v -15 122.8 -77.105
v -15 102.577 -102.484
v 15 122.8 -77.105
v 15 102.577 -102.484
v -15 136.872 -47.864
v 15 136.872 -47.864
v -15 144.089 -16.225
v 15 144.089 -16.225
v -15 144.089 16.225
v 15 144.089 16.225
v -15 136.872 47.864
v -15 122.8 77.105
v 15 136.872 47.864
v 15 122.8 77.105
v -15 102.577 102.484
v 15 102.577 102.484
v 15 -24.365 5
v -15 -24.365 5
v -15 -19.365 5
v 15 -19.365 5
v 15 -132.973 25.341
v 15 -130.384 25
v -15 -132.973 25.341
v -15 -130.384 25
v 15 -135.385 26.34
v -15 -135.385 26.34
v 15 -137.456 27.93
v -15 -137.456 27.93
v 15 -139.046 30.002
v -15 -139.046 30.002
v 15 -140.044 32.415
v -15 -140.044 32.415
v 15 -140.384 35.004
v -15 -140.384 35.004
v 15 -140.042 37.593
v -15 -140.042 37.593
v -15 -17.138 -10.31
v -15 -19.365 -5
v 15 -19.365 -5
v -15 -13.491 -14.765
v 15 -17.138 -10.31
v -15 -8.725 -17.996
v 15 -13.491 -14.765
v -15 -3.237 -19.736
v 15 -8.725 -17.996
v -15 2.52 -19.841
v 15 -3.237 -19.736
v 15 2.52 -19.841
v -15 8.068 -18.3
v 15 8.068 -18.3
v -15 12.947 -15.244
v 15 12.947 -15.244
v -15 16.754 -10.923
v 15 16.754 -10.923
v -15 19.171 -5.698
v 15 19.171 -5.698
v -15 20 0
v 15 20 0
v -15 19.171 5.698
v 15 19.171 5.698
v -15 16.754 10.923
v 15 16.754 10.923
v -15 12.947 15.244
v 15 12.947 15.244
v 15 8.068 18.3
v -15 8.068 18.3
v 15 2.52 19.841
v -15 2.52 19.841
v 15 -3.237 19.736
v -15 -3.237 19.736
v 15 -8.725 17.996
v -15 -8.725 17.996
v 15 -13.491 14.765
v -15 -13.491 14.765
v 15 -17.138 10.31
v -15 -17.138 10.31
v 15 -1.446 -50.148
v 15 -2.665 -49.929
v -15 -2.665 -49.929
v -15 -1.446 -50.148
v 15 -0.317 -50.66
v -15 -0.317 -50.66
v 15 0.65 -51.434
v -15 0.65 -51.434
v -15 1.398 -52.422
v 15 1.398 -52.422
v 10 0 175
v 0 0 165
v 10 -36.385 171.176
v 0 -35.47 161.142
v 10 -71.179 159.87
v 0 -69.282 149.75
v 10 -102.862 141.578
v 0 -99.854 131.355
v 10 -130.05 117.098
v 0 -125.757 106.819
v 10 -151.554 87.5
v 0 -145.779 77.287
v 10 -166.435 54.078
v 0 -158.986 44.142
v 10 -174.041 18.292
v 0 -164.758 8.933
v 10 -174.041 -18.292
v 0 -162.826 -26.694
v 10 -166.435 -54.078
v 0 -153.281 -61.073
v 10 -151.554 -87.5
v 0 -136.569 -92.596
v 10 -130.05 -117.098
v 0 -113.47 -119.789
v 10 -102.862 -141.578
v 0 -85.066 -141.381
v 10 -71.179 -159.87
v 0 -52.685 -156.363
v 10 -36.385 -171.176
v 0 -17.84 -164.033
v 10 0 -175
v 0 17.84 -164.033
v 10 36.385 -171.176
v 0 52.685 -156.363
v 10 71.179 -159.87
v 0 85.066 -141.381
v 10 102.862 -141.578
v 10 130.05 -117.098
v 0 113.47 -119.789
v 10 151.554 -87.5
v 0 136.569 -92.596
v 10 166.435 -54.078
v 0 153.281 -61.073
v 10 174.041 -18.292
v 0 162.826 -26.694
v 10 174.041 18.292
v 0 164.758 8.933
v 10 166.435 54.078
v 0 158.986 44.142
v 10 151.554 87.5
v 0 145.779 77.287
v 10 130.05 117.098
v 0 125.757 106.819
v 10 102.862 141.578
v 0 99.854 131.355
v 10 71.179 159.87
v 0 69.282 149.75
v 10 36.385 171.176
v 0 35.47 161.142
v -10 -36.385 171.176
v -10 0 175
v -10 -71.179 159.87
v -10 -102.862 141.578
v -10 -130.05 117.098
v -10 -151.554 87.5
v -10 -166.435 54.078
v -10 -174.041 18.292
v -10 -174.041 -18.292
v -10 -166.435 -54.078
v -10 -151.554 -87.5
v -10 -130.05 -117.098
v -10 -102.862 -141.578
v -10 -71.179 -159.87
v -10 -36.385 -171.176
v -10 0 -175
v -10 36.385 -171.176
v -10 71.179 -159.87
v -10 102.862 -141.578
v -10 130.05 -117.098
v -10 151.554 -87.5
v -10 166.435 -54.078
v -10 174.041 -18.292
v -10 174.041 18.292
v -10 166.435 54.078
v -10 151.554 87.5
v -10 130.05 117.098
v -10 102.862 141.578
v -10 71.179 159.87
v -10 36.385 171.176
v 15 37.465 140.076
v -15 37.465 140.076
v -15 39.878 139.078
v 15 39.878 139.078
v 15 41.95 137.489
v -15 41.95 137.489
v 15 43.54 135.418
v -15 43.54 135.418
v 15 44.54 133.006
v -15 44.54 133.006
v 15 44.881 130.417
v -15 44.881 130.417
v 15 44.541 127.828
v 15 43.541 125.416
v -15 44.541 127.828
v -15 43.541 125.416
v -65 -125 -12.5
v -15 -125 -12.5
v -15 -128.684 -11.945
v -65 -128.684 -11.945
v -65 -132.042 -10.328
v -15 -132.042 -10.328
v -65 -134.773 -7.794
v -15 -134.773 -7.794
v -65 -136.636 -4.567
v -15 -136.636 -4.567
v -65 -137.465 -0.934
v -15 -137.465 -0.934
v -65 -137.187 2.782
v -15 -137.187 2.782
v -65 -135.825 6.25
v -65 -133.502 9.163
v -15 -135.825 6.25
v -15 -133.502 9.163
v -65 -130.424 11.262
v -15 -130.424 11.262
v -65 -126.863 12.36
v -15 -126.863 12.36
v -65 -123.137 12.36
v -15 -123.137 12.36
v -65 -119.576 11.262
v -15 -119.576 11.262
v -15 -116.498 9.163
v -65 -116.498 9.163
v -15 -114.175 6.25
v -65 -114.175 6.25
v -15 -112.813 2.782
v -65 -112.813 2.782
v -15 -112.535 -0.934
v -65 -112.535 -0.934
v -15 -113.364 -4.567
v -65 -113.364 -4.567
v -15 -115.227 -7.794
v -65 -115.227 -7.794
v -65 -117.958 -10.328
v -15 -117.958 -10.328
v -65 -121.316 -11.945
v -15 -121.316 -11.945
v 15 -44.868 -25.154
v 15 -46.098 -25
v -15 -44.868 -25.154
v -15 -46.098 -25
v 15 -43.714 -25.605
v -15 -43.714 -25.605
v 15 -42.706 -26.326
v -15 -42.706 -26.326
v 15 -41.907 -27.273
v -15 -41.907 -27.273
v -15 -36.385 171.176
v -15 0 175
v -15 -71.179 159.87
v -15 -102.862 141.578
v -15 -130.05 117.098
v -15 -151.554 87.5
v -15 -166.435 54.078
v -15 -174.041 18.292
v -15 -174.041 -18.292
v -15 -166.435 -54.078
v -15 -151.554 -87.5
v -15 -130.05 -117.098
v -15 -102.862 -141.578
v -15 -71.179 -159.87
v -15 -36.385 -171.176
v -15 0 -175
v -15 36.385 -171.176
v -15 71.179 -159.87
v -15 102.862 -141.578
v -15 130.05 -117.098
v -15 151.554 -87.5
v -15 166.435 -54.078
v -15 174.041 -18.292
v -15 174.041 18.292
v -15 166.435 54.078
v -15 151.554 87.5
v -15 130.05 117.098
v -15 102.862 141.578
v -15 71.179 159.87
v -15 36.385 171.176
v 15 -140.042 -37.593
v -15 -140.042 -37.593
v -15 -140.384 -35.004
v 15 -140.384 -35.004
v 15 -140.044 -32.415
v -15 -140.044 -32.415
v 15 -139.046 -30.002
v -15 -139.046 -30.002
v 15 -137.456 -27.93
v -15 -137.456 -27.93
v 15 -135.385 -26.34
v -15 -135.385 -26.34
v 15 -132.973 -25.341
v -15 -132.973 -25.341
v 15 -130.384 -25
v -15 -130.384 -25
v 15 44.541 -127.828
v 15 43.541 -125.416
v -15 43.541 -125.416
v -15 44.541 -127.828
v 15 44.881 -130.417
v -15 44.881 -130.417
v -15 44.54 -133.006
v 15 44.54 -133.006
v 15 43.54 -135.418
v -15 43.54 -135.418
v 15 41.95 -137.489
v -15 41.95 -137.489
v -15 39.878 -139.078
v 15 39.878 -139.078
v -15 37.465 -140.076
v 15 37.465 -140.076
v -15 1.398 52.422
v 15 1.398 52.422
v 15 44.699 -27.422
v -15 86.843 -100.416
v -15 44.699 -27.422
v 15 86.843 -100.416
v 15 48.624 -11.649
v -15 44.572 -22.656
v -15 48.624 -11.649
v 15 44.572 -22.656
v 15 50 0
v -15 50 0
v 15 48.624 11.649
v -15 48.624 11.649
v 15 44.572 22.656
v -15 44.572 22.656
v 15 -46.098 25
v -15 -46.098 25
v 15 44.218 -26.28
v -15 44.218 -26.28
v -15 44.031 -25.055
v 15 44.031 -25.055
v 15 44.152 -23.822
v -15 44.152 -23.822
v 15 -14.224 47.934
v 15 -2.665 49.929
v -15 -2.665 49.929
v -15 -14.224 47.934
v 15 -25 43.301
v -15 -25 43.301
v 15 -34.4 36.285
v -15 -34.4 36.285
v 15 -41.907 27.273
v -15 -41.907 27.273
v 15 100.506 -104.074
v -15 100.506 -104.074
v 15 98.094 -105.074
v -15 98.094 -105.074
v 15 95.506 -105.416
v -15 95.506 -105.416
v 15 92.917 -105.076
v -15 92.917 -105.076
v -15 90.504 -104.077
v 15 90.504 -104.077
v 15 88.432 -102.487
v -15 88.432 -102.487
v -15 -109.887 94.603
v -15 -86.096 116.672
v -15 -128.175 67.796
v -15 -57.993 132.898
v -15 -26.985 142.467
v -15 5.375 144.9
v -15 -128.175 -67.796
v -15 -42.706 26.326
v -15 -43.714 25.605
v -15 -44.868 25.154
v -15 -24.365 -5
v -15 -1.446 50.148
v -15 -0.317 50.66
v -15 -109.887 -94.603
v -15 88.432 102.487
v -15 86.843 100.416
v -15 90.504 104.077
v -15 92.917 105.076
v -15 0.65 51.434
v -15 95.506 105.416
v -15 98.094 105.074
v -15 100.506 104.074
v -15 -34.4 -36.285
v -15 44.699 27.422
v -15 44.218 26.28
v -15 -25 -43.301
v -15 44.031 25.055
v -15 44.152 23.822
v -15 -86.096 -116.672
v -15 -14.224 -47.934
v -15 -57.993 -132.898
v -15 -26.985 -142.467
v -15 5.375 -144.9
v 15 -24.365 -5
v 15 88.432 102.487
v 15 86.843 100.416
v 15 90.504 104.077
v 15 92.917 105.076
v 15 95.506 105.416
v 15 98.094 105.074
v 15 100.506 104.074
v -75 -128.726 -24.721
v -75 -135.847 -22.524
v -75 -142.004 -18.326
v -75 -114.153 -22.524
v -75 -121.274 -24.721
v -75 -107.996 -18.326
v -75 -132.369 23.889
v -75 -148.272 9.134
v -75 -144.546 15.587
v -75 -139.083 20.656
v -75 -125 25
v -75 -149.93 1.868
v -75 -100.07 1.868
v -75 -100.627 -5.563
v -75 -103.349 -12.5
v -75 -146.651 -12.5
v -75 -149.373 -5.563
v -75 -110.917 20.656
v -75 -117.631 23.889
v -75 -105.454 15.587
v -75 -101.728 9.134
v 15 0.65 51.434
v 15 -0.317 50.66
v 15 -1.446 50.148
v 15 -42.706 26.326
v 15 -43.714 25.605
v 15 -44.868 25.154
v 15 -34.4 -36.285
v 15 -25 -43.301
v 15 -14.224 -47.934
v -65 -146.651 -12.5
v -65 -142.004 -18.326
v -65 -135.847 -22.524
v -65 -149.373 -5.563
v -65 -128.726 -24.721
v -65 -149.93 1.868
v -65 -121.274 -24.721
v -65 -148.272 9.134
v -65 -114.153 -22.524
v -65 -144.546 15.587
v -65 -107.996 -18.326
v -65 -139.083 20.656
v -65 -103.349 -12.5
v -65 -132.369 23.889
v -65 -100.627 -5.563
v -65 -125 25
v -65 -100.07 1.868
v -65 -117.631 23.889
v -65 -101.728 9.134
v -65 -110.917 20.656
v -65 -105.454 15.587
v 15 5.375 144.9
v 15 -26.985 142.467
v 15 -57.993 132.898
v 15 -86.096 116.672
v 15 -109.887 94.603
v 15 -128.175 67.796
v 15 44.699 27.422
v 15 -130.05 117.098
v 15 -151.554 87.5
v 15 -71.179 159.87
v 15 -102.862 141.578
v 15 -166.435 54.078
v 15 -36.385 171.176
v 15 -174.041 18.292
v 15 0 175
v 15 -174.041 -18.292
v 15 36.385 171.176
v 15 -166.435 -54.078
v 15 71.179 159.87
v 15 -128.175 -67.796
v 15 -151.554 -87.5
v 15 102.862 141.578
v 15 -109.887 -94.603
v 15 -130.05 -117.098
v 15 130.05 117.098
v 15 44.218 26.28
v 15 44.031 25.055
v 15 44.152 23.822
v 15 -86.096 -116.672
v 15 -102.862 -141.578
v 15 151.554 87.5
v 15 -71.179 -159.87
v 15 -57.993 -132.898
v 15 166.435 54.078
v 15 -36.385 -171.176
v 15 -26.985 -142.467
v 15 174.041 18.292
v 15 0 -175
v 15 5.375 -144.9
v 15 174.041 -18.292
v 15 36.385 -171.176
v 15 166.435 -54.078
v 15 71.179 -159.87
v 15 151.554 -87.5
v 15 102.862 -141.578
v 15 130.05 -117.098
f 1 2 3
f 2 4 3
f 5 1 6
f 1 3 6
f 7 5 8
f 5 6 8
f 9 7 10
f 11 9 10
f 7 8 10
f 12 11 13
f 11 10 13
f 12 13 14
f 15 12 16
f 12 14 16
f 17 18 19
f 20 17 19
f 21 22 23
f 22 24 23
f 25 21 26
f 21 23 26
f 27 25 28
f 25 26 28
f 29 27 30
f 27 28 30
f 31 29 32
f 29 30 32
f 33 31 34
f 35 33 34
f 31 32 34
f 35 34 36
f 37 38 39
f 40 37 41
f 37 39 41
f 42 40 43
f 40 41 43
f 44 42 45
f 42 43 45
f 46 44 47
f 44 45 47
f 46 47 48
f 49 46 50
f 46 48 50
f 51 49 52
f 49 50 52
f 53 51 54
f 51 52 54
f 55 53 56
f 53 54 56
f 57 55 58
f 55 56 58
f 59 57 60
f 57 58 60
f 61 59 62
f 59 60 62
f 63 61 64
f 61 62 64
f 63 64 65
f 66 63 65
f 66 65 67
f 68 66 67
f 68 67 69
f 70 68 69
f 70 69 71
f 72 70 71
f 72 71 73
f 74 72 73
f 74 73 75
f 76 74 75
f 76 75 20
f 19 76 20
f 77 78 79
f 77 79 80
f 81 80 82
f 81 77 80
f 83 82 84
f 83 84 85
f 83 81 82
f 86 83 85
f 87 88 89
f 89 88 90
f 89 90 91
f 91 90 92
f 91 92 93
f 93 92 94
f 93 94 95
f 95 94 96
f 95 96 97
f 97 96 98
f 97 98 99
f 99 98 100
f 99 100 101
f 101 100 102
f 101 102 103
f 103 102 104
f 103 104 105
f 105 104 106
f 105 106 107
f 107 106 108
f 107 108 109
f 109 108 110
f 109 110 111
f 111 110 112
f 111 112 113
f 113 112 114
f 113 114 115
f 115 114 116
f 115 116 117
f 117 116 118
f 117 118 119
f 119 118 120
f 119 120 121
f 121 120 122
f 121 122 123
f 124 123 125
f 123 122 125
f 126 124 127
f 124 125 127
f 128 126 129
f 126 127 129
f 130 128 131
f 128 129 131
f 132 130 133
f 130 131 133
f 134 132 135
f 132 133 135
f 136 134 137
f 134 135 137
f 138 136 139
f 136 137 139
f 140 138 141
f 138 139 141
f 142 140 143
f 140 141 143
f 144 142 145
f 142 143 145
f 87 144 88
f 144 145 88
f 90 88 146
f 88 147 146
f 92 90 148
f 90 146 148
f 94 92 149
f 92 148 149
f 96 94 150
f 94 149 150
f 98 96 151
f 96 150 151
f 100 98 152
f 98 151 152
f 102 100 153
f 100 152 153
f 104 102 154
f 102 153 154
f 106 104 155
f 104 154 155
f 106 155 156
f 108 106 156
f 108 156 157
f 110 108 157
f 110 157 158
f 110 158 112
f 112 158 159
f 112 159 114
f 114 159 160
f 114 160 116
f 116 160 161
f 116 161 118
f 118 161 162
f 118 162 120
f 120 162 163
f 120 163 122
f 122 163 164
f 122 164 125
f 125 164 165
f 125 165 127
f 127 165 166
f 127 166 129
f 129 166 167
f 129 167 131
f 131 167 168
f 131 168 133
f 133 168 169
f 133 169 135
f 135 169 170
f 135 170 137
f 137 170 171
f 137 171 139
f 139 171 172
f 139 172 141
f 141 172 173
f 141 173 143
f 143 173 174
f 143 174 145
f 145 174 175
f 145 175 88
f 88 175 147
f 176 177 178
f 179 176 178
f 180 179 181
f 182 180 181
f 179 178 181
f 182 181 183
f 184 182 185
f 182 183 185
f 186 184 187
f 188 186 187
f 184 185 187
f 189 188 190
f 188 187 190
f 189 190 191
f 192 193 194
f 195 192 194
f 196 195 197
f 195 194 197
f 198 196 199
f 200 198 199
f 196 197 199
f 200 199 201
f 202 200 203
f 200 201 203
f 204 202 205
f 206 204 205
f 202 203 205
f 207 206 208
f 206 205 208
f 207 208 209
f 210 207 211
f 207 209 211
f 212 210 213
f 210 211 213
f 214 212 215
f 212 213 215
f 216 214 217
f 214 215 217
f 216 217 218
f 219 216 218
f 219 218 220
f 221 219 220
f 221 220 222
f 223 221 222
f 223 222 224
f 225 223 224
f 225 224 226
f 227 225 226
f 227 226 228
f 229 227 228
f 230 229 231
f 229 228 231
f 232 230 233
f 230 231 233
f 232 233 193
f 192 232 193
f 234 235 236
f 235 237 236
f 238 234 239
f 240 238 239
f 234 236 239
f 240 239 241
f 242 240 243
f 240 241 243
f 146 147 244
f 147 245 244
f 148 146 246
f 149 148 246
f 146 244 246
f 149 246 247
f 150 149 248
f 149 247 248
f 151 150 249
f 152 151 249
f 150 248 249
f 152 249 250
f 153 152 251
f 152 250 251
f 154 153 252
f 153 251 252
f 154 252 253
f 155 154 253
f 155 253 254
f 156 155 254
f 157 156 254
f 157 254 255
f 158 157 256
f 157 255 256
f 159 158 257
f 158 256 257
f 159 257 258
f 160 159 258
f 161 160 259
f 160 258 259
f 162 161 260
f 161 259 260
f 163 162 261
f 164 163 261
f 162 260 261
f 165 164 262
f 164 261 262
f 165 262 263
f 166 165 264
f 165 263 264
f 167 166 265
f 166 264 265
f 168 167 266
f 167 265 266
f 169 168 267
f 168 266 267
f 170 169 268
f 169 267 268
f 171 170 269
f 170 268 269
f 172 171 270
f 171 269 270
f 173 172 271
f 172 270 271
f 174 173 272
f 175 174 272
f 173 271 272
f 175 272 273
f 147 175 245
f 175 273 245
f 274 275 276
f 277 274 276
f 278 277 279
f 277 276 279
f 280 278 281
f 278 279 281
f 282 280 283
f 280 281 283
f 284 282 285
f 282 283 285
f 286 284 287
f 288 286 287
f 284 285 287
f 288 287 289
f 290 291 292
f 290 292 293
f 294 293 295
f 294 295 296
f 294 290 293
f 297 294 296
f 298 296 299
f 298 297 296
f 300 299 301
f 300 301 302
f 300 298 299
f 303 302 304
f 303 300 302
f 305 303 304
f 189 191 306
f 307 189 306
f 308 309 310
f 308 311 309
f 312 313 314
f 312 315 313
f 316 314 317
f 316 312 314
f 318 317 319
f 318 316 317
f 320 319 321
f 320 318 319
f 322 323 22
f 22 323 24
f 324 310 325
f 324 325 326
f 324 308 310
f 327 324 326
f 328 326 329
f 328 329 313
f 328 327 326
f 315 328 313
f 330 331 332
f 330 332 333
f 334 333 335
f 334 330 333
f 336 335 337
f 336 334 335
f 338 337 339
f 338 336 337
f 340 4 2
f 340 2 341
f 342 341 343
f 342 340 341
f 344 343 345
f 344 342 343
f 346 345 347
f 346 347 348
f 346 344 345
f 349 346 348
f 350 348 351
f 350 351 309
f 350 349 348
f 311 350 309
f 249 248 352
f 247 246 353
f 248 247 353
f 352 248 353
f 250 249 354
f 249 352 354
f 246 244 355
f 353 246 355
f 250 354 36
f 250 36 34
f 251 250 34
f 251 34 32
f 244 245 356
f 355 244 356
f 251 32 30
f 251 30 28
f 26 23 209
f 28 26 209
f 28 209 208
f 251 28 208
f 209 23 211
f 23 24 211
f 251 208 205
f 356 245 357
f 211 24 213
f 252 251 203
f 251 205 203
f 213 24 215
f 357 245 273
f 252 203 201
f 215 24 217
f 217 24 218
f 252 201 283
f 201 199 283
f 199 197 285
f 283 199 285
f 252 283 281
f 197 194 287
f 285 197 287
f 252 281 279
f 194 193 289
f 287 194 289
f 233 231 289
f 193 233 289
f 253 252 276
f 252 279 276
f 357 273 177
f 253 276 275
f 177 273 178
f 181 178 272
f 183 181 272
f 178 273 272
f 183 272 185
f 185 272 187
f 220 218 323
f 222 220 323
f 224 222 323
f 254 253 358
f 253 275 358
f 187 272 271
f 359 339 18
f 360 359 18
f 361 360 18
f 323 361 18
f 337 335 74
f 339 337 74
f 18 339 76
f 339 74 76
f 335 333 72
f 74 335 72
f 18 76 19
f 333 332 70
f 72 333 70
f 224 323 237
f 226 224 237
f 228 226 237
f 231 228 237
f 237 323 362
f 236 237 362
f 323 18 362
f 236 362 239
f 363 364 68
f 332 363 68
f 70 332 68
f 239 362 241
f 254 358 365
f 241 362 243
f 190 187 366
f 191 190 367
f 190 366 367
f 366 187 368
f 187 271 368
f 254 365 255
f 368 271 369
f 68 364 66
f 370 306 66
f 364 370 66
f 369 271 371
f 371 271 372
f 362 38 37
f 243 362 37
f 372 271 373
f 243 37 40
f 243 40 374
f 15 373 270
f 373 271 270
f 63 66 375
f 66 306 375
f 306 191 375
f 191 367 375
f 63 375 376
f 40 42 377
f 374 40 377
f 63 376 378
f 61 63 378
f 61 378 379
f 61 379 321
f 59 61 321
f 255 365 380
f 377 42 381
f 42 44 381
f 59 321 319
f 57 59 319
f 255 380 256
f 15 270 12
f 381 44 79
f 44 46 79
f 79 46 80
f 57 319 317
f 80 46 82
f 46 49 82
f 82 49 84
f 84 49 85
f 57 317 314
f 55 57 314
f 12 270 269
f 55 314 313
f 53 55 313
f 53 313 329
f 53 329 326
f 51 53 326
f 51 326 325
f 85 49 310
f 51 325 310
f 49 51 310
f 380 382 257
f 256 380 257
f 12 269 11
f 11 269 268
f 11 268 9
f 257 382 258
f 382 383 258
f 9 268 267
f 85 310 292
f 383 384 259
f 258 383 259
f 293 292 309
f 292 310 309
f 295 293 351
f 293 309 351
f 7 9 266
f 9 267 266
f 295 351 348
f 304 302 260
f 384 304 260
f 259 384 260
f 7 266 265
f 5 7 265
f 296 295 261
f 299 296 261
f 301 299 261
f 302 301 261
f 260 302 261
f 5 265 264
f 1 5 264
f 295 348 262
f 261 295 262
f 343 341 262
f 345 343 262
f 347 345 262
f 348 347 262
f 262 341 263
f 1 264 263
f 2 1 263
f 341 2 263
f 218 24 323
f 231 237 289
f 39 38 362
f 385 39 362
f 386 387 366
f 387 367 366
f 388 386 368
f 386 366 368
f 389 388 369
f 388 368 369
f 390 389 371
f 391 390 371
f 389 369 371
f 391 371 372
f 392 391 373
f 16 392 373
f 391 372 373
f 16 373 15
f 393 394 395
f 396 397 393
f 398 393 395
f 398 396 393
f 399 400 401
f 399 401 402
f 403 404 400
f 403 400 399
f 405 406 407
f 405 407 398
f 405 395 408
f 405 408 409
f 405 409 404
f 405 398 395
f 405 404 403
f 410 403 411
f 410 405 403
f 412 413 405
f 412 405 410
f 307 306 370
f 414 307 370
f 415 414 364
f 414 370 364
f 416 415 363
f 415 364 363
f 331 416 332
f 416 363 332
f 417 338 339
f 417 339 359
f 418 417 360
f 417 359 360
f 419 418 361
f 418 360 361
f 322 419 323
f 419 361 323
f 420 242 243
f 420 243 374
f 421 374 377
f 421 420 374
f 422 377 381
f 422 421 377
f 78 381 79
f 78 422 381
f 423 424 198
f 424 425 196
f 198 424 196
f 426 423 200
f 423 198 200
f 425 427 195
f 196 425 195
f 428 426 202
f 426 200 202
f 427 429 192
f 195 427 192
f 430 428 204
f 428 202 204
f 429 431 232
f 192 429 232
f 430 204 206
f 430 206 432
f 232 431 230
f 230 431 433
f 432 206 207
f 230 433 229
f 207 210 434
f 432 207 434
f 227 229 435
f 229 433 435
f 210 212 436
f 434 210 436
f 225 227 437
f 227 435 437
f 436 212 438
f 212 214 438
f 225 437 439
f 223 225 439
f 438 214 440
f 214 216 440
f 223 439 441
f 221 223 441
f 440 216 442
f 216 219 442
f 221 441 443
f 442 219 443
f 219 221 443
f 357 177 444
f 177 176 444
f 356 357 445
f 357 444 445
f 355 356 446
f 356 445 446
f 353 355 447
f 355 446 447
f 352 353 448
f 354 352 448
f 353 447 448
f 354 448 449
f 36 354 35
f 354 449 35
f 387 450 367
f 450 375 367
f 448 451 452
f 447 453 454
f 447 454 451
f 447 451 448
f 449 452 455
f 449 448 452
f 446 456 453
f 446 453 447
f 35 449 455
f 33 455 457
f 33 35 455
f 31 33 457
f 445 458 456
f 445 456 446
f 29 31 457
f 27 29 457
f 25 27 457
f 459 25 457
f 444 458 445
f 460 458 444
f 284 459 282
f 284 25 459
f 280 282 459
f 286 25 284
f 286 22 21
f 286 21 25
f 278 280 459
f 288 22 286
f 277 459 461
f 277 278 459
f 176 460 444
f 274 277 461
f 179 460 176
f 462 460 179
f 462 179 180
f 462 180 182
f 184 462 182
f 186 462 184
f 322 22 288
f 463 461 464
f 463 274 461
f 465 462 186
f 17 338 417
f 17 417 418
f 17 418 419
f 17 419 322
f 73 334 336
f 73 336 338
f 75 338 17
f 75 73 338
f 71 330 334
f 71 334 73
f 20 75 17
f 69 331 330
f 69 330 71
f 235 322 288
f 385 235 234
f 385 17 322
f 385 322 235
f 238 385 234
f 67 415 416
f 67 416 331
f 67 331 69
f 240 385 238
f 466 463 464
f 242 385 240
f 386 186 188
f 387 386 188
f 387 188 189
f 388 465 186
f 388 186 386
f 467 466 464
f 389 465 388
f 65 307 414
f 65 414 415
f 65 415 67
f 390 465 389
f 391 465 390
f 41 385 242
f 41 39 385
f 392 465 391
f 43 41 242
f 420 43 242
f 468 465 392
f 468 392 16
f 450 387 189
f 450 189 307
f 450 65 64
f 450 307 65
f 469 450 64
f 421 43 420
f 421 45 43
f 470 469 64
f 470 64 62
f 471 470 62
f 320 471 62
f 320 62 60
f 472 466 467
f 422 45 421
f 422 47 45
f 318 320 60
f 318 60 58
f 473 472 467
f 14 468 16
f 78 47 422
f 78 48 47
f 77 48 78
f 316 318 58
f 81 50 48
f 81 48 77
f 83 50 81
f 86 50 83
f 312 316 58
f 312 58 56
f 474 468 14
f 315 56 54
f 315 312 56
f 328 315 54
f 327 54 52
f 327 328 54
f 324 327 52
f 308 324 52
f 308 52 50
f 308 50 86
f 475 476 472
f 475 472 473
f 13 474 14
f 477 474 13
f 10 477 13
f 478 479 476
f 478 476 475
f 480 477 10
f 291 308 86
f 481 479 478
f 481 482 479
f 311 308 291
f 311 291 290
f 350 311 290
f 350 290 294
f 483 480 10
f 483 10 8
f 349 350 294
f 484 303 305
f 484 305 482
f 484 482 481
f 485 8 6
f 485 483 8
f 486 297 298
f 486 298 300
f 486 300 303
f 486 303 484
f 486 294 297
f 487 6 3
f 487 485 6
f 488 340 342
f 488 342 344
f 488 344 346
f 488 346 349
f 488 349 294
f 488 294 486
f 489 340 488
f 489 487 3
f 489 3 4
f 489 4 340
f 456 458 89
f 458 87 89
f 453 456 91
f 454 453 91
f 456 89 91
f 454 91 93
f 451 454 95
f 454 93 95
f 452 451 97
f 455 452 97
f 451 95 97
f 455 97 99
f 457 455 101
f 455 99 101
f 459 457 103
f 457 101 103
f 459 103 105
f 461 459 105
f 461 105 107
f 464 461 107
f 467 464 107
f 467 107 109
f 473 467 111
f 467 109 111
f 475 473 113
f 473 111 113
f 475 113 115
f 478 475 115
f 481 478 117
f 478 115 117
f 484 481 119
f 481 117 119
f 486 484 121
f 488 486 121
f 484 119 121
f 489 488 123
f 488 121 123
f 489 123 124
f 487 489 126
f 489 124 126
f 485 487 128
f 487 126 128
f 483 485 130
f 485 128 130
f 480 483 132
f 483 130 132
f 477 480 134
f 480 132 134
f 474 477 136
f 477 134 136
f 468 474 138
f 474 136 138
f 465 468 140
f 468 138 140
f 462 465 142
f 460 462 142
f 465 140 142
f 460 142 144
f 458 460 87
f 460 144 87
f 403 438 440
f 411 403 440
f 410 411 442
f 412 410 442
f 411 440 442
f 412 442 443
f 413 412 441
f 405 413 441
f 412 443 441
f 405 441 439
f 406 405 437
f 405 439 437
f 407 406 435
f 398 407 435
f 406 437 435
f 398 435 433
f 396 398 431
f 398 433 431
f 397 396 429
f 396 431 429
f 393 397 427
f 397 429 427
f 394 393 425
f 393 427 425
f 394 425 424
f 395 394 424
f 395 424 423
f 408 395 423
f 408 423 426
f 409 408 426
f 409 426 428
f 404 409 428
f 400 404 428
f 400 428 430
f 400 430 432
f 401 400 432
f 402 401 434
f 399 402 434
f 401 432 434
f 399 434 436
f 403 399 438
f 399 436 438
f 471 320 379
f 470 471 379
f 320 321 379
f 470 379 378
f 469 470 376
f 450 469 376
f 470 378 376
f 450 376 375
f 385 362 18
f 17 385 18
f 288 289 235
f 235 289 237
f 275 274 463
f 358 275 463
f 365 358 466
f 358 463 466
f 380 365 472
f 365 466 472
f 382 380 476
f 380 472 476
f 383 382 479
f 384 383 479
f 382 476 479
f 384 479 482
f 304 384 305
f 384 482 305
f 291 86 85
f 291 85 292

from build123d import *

# Parameters (mm, degrees)
SKETCH1_W           = 30
SKETCH1_H           = 30
BOSS_EXTRUDE1_DEPTH = 15
SKETCH3_R           = 12.5
BOSS_EXTRUDE2_DEPTH = 50
BOSS_EXTRUDE3_START = 50
SKETCH3_3_R         = 25
SKETCH3_3_R_2       = 12.5
BOSS_EXTRUDE3_DEPTH = 10
CUT_EXTRUDE1_DEPTH  = 255.656631565


with BuildPart() as part:
    # Sketch1 → Revolve1 (revolve)
    with BuildSketch(Plane(origin=(0, 0, 0), x_dir=(1, 0, 0), z_dir=(0, 1, 0)), mode=Mode.PRIVATE) as revolve1_sk:
        Polygon((-15, 175), (-15, 145), (15, 145), (15, 175), (10, 175), (0, 165), (-10, 175), align=None)
        with Locations((0, 35)):
            Rectangle(SKETCH1_W, SKETCH1_H)
    revolve(revolve1_sk.sketch.rotate(Axis((0, 0, 0), (1, 0, 0)), 180), axis=Axis((0, 0, 0), (1, 0, 0)))

    # Sketch2 → Boss-Extrude1 (add, symmetric)
    with BuildSketch(Plane(origin=(0, 0, 0), x_dir=(0, 0, -1), z_dir=(1, 0, 0))):
        with BuildLine():
            Line((25, -130.384048104), (25, -46.097722286))
            ThreePointArc((25, -46.097722286), (25.604754635, -43.714065813), (27.272727273, -41.90702026))
            ThreePointArc((27.272727273, -41.90702026), (0, -50), (-27.272727273, -41.90702026))
            ThreePointArc((-27.272727273, -41.90702026), (-25.604754635, -43.714065813), (-25, -46.097722286))
            Line((-25, -46.097722286), (-25, -130.384048104))
            ThreePointArc((-25, -130.384048104), (-28.914193805, -138.31896858), (-37.592592593, -140.042125741))
            ThreePointArc((-37.592592593, -140.042125741), (0, -145), (37.592592593, -140.042125741))
            ThreePointArc((37.592592593, -140.042125741), (28.914193805, -138.31896858), (25, -130.384048104))
        make_face()
        with BuildLine():
            ThreePointArc((-52.421798557, 1.398226049), (-50.659868815, -0.317335065), (-49.928907779, -2.665364518))
            ThreePointArc((-49.928907779, -2.665364518), (-43.301270189, 25), (-22.656180506, 44.572384779))
            ThreePointArc((-22.656180506, 44.572384779), (-25.05511418, 44.031400878), (-27.421798557, 44.699496238))
            Line((-27.421798557, 44.699496238), (-100.415897906, 86.842659147))
            ThreePointArc((-100.415897906, 86.842659147), (-105.330643713, 94.199910656), (-102.483742196, 102.57720305))
            ThreePointArc((-102.483742196, 102.57720305), (-125.573683549, 72.5), (-140.076334788, 37.464922691))
            ThreePointArc((-140.076334788, 37.464922691), (-134.244837518, 44.119057925), (-125.415897906, 43.541388957))
            Line((-125.415897906, 43.541388957), (-52.421798557, 1.398226049))
        make_face()
        with BuildLine():
            ThreePointArc((22.656180506, 44.572384779), (43.301270189, 25), (49.928907779, -2.665364518))
            ThreePointArc((49.928907779, -2.665364518), (50.659868815, -0.317335065), (52.421798557, 1.398226049))
            Line((52.421798557, 1.398226049), (125.415897906, 43.541388957))
            ThreePointArc((125.415897906, 43.541388957), (134.244837518, 44.119057925), (140.076334788, 37.464922691))
            ThreePointArc((140.076334788, 37.464922691), (125.573683549, 72.5), (102.483742196, 102.57720305))
            ThreePointArc((102.483742196, 102.57720305), (105.330643713, 94.199910656), (100.415897906, 86.842659147))
            Line((100.415897906, 86.842659147), (27.421798557, 44.699496238))
            ThreePointArc((27.421798557, 44.699496238), (25.05511418, 44.031400878), (22.656180506, 44.572384779))
        make_face()
    extrude(amount=BOSS_EXTRUDE1_DEPTH, both=True)

    # Sketch3 → Boss-Extrude2 (add)
    with BuildSketch(Plane.ZY.offset(15)):
        with Locations(Location((0, -125, 0), (0, 0, 180))):
            Circle(SKETCH3_R)
    extrude(amount=BOSS_EXTRUDE2_DEPTH)

    # Sketch3<3> → Boss-Extrude3 (add)
    # profile 1 of 2: a face of its own
    with BuildSketch(Plane.ZY.offset(15).offset(BOSS_EXTRUDE3_START)):
        with Locations((0, -125)):
            Circle(SKETCH3_3_R)
        with Locations(Location((0, -125, 0), (0, 0, 180))):
            Circle(SKETCH3_3_R_2, mode=Mode.SUBTRACT)
    # profile 2 of 2: a face of its own
    with BuildSketch(Plane.ZY.offset(15).offset(BOSS_EXTRUDE3_START)):
        with Locations(Location((0, -125, 0), (0, 0, 180))):
            Circle(SKETCH3_3_R_2)
    extrude(amount=BOSS_EXTRUDE3_DEPTH)

    # Sketch4 → Cut-Extrude1 (cut, through all)
    with BuildSketch(Plane.ZY.offset(15)):
        with BuildLine():
            Line((5, -24.364916731), (5, -19.364916731))
            ThreePointArc((5, -19.364916731), (0, -20), (-5, -19.364916731))
            Line((-5, -19.364916731), (-5, -24.364916731))
            Line((-5, -24.364916731), (5, -24.364916731))
        make_face()
    extrude(amount=-CUT_EXTRUDE1_DEPTH, mode=Mode.SUBTRACT)


solid = part.part
